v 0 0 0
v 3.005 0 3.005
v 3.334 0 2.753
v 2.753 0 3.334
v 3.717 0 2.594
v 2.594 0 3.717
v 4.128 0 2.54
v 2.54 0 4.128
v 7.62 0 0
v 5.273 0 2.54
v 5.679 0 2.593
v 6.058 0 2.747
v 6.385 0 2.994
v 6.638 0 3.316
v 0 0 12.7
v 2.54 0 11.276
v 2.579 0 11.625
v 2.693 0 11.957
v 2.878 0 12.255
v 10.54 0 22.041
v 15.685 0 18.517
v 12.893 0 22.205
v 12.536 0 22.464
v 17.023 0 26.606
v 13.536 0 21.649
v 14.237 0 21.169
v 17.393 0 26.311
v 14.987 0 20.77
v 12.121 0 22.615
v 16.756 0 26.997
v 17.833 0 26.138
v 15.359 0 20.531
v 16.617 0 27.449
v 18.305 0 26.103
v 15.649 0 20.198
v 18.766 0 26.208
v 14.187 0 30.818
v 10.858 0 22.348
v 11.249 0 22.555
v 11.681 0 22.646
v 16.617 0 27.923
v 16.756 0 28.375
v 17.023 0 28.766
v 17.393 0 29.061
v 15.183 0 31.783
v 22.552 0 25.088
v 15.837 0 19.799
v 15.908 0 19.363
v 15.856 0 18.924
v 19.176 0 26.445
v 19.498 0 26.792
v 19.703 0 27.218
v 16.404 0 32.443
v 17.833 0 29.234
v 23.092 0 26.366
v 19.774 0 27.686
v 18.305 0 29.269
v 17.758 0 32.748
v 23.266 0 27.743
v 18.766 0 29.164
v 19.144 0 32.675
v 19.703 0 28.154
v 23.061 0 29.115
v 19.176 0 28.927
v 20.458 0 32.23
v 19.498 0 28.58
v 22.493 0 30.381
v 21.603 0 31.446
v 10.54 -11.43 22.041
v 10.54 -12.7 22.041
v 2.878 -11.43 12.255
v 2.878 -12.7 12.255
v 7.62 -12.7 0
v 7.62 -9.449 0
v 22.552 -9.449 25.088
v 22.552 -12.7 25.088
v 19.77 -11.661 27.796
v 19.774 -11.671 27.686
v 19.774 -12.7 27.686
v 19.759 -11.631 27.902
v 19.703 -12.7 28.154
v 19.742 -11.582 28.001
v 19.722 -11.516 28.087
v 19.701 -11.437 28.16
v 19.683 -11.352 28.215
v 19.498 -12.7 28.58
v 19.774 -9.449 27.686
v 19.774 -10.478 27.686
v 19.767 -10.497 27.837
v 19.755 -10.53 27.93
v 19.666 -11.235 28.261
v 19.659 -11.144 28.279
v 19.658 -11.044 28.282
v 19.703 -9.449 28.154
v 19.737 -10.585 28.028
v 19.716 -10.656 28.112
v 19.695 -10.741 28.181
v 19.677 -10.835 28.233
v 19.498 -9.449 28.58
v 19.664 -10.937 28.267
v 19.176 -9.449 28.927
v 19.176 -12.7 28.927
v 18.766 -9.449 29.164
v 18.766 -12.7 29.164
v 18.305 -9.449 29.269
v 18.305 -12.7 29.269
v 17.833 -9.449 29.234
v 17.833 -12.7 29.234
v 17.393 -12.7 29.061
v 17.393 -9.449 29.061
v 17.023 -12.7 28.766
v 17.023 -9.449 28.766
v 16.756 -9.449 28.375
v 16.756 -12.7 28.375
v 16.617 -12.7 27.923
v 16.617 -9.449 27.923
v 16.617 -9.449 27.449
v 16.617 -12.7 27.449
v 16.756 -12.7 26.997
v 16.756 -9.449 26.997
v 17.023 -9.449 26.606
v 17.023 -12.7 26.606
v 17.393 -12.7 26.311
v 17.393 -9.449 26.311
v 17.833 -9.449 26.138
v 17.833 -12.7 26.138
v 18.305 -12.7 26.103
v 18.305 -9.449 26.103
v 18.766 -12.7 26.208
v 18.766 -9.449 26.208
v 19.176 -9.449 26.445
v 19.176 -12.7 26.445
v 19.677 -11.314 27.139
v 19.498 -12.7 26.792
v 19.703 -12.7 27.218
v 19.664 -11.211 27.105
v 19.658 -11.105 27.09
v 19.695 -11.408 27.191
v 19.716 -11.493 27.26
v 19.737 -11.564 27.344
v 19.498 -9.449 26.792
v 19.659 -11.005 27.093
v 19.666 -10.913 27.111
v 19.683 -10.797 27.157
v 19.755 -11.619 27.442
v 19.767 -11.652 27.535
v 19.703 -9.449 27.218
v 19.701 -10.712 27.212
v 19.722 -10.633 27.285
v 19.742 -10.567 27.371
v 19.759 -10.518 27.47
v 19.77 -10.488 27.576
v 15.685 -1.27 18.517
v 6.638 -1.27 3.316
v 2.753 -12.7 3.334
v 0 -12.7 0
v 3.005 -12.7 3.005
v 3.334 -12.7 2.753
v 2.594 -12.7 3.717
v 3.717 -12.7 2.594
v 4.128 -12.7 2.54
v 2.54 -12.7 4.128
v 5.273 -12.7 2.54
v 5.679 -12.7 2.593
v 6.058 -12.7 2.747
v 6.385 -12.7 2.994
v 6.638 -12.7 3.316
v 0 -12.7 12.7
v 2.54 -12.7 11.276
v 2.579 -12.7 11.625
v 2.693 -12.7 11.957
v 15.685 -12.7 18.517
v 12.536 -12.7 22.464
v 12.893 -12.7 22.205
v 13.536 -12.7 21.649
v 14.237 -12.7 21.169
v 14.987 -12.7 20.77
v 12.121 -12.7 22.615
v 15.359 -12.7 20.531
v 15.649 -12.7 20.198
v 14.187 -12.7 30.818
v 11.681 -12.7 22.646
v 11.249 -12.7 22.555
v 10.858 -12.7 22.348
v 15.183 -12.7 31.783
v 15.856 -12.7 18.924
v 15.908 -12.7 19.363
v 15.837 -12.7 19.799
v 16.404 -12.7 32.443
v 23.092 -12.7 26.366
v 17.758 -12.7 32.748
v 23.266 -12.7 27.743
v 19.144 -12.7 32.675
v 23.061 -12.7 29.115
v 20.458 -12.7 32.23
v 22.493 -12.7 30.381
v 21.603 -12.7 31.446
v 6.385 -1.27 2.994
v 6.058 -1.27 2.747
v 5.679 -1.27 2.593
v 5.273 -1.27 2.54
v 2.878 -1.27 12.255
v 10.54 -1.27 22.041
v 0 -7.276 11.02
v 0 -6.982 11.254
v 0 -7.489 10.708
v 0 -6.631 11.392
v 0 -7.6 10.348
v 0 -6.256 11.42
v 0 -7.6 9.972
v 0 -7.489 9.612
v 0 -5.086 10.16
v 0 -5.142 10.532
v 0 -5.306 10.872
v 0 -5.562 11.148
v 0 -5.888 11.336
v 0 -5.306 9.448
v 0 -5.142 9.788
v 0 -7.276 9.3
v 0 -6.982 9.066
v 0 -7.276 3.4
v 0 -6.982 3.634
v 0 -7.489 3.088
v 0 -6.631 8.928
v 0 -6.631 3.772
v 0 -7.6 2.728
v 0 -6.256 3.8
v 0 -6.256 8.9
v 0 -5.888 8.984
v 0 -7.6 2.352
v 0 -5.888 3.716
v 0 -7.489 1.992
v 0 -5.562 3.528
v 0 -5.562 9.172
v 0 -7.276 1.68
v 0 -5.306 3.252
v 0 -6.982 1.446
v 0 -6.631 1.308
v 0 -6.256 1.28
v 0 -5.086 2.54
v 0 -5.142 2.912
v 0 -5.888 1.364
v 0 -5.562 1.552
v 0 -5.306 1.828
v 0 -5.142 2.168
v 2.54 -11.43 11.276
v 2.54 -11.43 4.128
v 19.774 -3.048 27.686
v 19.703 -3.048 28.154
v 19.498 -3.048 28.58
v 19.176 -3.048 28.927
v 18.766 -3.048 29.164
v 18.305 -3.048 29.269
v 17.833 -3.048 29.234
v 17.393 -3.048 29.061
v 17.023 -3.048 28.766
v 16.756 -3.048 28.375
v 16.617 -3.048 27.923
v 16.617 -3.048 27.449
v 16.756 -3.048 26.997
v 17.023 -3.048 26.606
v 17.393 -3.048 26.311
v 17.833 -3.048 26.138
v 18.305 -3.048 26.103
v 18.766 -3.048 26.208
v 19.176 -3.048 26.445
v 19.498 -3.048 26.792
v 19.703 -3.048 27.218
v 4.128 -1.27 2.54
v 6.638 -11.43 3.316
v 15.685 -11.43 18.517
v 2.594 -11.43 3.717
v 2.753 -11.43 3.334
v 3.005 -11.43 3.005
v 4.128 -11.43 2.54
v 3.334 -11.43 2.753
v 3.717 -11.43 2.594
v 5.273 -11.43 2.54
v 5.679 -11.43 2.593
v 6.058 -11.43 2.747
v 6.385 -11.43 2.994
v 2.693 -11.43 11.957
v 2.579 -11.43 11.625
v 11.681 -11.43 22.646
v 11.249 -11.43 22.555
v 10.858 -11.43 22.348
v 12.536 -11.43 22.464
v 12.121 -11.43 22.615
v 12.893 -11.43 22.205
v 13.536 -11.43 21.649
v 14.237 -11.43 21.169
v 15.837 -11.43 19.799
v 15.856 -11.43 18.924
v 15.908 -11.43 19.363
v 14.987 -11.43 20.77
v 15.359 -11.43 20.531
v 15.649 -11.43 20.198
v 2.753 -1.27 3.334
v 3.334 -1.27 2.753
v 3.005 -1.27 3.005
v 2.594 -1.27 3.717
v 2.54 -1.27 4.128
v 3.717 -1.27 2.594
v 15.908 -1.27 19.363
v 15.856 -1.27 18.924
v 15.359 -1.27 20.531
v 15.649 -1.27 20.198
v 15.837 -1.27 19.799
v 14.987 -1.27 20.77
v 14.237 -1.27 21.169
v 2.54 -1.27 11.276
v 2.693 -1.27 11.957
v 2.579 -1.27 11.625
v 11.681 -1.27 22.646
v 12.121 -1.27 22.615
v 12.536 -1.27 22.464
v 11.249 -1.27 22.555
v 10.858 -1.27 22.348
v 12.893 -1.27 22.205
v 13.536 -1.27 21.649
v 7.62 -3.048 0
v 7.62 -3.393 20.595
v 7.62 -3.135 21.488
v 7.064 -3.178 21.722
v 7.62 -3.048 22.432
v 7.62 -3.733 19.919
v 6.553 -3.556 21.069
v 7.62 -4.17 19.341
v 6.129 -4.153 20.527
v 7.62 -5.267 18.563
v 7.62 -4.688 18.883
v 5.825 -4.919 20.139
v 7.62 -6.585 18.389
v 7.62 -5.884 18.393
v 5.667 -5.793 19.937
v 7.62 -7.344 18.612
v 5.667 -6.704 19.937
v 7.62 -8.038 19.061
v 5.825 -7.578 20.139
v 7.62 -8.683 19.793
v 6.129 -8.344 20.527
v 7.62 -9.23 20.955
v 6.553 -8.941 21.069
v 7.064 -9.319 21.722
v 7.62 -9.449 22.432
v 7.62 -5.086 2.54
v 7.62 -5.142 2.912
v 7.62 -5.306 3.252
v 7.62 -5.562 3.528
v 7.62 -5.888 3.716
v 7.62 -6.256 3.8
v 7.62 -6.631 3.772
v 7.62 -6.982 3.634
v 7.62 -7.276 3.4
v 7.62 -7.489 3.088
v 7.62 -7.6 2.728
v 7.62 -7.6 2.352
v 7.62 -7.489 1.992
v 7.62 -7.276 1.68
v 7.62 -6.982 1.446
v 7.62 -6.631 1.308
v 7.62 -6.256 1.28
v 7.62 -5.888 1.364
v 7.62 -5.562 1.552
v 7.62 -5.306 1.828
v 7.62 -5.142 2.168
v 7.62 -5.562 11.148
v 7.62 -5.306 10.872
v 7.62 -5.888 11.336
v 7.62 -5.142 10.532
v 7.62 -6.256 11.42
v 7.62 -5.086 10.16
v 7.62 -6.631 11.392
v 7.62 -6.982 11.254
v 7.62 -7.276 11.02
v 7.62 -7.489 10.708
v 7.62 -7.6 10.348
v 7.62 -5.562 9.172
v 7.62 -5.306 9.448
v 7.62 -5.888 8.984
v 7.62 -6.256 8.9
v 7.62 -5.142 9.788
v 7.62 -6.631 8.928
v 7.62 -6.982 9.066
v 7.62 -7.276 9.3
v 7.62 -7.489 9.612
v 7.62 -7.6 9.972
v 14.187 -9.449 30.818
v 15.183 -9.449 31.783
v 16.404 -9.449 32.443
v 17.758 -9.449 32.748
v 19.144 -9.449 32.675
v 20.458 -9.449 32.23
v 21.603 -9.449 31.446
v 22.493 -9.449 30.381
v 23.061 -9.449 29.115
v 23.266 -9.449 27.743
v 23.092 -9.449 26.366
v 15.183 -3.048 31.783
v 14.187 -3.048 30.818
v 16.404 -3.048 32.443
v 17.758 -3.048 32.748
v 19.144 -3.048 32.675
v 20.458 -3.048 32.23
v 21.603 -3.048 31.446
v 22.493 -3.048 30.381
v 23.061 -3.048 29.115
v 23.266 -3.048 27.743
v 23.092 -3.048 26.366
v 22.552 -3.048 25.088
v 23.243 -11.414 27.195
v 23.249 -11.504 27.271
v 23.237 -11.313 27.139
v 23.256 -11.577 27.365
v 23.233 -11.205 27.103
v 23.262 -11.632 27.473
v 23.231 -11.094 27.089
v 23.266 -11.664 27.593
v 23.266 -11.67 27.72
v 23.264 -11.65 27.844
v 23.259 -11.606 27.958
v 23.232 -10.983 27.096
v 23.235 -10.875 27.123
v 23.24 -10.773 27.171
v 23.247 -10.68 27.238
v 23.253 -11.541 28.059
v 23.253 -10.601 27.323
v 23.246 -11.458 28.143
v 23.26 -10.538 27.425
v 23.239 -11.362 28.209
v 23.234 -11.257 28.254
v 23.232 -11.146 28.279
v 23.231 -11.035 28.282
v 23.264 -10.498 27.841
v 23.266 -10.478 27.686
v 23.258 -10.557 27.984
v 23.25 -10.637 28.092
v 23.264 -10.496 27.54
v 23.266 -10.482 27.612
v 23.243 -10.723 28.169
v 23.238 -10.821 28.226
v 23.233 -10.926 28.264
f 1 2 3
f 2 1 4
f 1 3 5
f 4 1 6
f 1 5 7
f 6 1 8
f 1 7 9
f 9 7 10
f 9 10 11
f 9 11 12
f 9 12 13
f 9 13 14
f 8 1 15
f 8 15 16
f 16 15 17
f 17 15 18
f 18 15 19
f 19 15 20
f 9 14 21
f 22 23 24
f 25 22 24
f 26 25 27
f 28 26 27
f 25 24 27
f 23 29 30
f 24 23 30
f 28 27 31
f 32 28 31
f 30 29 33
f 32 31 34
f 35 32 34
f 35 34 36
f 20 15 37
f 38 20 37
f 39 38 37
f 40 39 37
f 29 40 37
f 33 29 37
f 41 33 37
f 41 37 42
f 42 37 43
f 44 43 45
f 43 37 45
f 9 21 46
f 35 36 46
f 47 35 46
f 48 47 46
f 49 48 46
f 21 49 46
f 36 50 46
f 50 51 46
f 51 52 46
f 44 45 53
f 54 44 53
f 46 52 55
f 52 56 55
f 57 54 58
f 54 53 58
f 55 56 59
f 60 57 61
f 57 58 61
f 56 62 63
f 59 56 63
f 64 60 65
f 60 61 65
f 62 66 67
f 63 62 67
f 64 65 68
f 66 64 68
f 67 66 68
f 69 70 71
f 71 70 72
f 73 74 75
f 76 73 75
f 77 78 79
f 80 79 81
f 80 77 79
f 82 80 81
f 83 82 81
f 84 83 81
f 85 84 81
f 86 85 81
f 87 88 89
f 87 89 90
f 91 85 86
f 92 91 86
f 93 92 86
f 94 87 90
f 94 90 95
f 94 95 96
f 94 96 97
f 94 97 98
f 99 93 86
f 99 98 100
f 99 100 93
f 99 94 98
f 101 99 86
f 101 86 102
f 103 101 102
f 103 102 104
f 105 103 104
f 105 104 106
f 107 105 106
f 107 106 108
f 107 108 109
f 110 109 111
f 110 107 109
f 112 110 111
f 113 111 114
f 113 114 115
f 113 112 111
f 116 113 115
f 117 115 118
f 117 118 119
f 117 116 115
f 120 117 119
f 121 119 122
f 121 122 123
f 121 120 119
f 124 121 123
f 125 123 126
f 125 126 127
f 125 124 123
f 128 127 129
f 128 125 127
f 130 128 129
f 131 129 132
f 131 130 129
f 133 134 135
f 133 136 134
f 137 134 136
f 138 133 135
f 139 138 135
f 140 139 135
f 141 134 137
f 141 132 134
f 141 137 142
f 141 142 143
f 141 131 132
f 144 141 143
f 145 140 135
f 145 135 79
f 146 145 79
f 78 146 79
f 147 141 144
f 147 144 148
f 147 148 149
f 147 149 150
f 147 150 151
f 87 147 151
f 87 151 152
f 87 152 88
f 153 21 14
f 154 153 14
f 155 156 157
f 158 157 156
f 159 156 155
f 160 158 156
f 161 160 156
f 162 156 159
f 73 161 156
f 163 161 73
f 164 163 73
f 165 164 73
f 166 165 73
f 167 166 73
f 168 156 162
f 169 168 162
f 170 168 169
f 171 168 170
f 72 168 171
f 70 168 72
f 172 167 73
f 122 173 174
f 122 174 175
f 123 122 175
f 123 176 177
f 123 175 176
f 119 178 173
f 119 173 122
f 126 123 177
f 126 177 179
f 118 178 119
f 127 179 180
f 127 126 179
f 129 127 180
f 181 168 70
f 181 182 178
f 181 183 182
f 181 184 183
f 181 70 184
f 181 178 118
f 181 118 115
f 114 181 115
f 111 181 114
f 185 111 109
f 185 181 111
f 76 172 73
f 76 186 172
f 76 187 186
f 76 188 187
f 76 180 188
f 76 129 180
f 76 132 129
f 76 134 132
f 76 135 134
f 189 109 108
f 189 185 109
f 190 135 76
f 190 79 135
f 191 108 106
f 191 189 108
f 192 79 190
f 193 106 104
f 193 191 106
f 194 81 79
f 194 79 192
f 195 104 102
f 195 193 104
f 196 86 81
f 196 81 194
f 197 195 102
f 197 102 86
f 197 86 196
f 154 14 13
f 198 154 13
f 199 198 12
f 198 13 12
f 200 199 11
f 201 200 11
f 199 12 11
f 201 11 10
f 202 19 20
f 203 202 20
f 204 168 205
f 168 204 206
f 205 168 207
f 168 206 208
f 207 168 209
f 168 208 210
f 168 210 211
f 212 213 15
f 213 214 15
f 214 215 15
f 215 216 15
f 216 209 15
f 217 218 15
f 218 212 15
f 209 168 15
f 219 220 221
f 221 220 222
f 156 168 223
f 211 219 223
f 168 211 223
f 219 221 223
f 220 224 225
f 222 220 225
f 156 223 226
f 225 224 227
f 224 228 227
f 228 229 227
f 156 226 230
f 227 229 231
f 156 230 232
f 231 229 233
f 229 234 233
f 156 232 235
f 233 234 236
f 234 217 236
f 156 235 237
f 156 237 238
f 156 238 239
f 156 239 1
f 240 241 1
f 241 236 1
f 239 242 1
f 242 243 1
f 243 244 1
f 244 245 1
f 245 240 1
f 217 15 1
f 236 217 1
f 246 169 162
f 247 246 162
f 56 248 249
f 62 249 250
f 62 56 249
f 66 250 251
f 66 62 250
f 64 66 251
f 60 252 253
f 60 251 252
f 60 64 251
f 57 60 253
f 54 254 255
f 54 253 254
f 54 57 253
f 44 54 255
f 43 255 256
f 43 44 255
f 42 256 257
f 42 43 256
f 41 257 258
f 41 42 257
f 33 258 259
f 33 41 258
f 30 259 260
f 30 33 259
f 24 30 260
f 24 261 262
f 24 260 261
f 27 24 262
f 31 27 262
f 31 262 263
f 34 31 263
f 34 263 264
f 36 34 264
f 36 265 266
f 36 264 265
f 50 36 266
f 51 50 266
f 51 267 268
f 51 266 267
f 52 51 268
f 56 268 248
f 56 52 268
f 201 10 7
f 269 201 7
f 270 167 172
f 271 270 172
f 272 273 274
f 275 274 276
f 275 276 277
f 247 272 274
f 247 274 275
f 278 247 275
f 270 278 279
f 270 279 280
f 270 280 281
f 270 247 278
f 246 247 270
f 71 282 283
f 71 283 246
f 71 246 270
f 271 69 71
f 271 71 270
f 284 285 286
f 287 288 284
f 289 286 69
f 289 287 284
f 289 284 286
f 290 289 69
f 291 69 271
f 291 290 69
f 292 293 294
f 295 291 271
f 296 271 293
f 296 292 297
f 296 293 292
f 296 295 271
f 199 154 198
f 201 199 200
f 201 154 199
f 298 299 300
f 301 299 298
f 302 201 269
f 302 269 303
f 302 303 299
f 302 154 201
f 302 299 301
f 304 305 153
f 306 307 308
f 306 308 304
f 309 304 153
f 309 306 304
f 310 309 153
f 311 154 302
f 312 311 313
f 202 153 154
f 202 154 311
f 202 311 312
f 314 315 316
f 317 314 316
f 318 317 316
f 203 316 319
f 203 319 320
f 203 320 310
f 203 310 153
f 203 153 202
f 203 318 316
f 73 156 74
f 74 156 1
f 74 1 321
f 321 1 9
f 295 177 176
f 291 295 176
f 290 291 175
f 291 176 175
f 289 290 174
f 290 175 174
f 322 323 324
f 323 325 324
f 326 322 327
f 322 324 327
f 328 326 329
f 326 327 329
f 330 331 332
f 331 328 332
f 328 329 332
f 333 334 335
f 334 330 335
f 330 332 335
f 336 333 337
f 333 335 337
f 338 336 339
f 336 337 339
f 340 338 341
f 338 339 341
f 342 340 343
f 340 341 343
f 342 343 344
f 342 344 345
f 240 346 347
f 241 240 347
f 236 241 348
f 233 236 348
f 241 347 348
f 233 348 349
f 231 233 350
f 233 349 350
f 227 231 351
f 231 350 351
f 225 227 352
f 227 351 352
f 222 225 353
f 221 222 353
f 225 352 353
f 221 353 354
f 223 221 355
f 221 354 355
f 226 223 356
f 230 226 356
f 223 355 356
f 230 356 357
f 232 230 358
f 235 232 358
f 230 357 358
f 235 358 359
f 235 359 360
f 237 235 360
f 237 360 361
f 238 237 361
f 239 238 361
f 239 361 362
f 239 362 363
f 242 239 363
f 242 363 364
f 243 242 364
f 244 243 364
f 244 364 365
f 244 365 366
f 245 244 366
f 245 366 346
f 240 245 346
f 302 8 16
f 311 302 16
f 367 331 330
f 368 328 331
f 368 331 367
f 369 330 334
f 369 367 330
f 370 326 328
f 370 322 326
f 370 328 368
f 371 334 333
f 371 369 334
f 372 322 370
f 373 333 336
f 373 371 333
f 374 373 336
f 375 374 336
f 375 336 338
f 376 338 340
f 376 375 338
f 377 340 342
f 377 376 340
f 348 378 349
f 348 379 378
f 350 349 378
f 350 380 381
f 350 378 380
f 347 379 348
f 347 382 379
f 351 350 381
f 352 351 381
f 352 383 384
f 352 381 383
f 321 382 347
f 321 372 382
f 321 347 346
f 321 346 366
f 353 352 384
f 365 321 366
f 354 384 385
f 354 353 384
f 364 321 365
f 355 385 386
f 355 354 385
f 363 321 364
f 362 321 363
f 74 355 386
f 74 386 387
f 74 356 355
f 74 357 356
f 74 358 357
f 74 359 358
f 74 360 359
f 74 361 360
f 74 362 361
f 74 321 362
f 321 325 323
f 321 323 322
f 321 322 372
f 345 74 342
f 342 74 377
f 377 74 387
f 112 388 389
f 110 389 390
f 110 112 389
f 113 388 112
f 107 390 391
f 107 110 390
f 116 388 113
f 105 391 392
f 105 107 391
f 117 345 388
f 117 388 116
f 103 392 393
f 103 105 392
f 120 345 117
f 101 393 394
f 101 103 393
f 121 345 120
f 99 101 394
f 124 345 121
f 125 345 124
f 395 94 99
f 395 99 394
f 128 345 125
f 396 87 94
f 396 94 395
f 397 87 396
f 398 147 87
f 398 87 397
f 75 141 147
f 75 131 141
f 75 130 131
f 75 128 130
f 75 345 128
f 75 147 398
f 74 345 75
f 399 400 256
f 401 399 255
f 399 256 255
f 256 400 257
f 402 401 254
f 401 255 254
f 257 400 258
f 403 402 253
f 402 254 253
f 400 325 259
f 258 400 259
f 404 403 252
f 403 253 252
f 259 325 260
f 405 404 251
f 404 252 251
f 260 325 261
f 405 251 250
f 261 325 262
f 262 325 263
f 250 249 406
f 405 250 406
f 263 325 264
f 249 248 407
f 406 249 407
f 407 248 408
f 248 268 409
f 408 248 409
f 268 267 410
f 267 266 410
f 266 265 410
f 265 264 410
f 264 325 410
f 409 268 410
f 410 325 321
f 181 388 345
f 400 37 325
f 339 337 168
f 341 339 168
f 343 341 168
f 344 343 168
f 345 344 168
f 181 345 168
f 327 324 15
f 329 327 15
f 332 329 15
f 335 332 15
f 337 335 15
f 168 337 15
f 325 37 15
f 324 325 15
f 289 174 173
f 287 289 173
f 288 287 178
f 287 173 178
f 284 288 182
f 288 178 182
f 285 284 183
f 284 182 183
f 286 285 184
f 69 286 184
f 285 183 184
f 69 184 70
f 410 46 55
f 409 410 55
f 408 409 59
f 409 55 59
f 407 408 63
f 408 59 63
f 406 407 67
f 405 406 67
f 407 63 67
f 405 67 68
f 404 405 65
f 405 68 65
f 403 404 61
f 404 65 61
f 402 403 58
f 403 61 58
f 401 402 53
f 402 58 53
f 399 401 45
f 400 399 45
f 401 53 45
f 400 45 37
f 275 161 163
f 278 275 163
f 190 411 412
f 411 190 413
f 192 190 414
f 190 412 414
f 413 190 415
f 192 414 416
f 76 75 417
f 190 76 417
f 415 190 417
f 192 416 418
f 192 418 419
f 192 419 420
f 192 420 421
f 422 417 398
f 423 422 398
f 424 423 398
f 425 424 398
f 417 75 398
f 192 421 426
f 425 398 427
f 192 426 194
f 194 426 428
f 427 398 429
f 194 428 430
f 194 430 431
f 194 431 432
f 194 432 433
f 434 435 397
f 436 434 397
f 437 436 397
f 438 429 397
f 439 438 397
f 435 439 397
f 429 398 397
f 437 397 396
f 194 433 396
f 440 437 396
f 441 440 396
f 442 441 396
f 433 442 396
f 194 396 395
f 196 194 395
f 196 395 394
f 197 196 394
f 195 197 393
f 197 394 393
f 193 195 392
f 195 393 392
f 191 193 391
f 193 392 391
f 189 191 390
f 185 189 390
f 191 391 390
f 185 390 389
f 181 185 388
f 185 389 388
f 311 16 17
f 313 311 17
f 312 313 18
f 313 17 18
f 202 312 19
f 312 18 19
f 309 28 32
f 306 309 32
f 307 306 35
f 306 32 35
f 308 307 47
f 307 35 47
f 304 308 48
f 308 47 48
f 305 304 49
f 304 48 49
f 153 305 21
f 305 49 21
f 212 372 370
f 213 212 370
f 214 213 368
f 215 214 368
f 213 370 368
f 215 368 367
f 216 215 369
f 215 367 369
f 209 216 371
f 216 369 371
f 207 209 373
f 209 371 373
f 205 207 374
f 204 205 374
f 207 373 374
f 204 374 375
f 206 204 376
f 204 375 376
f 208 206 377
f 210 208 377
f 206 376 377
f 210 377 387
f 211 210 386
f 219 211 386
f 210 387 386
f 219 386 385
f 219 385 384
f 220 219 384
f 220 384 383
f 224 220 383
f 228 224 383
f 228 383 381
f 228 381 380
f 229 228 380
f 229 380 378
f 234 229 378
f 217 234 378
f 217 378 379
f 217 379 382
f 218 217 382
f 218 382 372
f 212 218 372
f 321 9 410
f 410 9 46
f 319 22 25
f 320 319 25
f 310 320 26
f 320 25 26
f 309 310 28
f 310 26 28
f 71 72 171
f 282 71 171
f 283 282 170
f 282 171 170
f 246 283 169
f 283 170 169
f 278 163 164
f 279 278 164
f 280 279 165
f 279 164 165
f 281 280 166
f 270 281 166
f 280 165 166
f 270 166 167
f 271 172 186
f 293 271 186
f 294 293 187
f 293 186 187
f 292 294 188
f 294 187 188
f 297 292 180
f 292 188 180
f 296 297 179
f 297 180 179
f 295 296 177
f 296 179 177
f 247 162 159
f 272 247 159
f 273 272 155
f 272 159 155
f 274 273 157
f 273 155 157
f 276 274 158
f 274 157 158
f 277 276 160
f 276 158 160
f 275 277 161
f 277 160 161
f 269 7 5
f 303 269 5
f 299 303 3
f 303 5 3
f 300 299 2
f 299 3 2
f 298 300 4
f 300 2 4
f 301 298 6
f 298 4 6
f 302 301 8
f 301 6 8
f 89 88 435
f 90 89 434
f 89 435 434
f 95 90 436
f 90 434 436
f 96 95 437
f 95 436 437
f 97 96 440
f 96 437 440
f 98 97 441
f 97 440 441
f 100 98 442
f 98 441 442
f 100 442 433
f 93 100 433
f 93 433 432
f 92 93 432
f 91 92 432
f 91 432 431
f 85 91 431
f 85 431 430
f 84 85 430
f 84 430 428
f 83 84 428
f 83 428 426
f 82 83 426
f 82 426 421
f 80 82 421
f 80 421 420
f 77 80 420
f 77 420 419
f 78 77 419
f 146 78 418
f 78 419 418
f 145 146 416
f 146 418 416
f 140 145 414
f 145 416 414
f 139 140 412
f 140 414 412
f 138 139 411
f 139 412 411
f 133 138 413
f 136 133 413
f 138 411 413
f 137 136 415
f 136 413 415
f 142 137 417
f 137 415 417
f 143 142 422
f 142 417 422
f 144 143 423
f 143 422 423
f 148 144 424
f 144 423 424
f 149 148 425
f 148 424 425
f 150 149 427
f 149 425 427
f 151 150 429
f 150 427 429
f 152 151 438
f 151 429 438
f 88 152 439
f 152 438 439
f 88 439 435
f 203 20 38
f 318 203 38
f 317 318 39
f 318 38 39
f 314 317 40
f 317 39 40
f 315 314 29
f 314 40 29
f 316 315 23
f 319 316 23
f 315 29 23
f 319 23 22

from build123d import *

# Parameters (mm, degrees)
F0_R      = 1.5875
F1_DEPTH  = 12.7
F3_DEPTH  = 1.27
F5_DEPTH  = 1.27
F7_D      = 2.5273
F8_W      = 15.6464
F8_H      = 6.4008
F9_DEPTH  = 32.767
F11_DEPTH = 26.1494109194
F13_R     = 0.5969
F14_DEPTH = 4.2418


with BuildPart() as f1:
    # F0 (on Front) → F1 (new body)
    with BuildSketch(Plane.XZ):
        with BuildLine():
            Line((0, 12.7), (0, 0))
            Line((0, 0), (7.62, 0))
            Line((7.62, 0), (22.5517244204, 25.0878578359))
            ThreePointArc((22.5517244204, 25.0878578359), (21.0572314123, 31.8770293487), (14.1866754903, 30.817869066))
            Line((14.1866754903, 30.817869066), (0, 12.7))
        make_face()
        with Locations((18.1864, 27.686)):
            Circle(F0_R, mode=Mode.SUBTRACT)
    extrude(amount=F1_DEPTH)

    # F2 (on face) → F3 (cut)
    with BuildSketch(Plane.XZ.offset(12.7)):
        with BuildLine():
            ThreePointArc((5.2733546579, 2.54), (6.0579673524, 2.7474495771), (6.6375185393, 3.3155805737))
            Line((6.6375185393, 3.3155805737), (15.6851948134, 18.5172284021))
            ThreePointArc((15.6851948134, 18.5172284021), (15.8374637284, 19.7988156089), (14.9874738748, 20.7699844097))
            ThreePointArc((14.9874738748, 20.7699844097), (13.8801528815, 21.3994559769), (12.8931539876, 22.2045816934))
            ThreePointArc((12.8931539876, 22.2045816934), (11.6805013198, 22.6463113598), (10.5404804924, 22.0413286293))
            Line((10.5404804924, 22.0413286293), (2.8775860907, 12.2550106486))
            ThreePointArc((2.8775860907, 12.2550106486), (2.6267677486, 11.7939490899), (2.54, 11.2763015655))
            Line((2.54, 11.2763015655), (2.54, 4.1275))
            ThreePointArc((2.54, 4.1275), (3.0049679849, 3.0049679849), (4.1275, 2.54))
            Line((4.1275, 2.54), (5.2733546579, 2.54))
        make_face()
    extrude(amount=-F3_DEPTH, mode=Mode.SUBTRACT)

    # F4 (on face) → F5 (cut)
    with BuildSketch(Plane(origin=(0, 0, 0), x_dir=(-1, 0, 0), z_dir=(0, 1, 0))):
        with BuildLine():
            ThreePointArc((-2.54, 11.2763015655), (-2.6267677486, 11.7939490899), (-2.8775860907, 12.2550106486))
            Line((-2.8775860907, 12.2550106486), (-10.5404804924, 22.0413286293))
            ThreePointArc((-10.5404804924, 22.0413286293), (-11.6805013198, 22.6463113598), (-12.8931539876, 22.2045816934))
            ThreePointArc((-12.8931539876, 22.2045816934), (-13.8801528815, 21.3994559769), (-14.9874738748, 20.7699844097))
            ThreePointArc((-14.9874738748, 20.7699844097), (-15.8374637284, 19.7988156089), (-15.6851948134, 18.5172284021))
            Line((-15.6851948134, 18.5172284021), (-6.6375185393, 3.3155805737))
            ThreePointArc((-6.6375185393, 3.3155805737), (-6.0579673524, 2.7474495771), (-5.2733546579, 2.54))
            Line((-5.2733546579, 2.54), (-4.1275, 2.54))
            ThreePointArc((-4.1275, 2.54), (-3.0049679849, 3.0049679849), (-2.54, 4.1275))
            Line((-2.54, 4.1275), (-2.54, 11.2763015655))
        make_face()
    extrude(amount=-F5_DEPTH, mode=Mode.SUBTRACT)

    # F7 (through all)
    with Locations(Plane(origin=(0, 0, 0), x_dir=(0, -1, 0), z_dir=(-1, 0, 0))):
        with Locations((6.35, 2.54), (6.35, 10.16)):
            Hole(F7_D / 2)

    # F8 (on face) → F9 (cut, through all)
    with BuildSketch(Plane(origin=(0, 0, 0), x_dir=(1, 0, 0), z_dir=(0, 0, -1))):
        with Locations((15.4432, 6.2484)):
            Rectangle(F8_W, F8_H)
    extrude(amount=-F9_DEPTH, mode=Mode.SUBTRACT)

    # F10 (on face) → F11 (cut, through all)
    with BuildSketch(Plane(origin=(-6.1646719805, 0, 4.8270688221), x_dir=(0, -1, 0), z_dir=(-0.7873473444, 0, 0.6165096587))):
        with BuildLine():
            ThreePointArc((3.048, 22.3592149561), (6.2484, 19.1588149561), (9.4488, 22.3592149561))
            Line((9.4488, 22.3592149561), (3.048, 22.3592149561))
        make_face()
    extrude(amount=-F11_DEPTH, mode=Mode.SUBTRACT)

    # F13 (on offset) → F14 (cut)
    with BuildSketch(Plane.YZ.offset(23.4188)):
        with Locations((-11.0744, 27.686)):
            Circle(F13_R)
    extrude(amount=-F14_DEPTH, mode=Mode.SUBTRACT)


solid = f1.part
